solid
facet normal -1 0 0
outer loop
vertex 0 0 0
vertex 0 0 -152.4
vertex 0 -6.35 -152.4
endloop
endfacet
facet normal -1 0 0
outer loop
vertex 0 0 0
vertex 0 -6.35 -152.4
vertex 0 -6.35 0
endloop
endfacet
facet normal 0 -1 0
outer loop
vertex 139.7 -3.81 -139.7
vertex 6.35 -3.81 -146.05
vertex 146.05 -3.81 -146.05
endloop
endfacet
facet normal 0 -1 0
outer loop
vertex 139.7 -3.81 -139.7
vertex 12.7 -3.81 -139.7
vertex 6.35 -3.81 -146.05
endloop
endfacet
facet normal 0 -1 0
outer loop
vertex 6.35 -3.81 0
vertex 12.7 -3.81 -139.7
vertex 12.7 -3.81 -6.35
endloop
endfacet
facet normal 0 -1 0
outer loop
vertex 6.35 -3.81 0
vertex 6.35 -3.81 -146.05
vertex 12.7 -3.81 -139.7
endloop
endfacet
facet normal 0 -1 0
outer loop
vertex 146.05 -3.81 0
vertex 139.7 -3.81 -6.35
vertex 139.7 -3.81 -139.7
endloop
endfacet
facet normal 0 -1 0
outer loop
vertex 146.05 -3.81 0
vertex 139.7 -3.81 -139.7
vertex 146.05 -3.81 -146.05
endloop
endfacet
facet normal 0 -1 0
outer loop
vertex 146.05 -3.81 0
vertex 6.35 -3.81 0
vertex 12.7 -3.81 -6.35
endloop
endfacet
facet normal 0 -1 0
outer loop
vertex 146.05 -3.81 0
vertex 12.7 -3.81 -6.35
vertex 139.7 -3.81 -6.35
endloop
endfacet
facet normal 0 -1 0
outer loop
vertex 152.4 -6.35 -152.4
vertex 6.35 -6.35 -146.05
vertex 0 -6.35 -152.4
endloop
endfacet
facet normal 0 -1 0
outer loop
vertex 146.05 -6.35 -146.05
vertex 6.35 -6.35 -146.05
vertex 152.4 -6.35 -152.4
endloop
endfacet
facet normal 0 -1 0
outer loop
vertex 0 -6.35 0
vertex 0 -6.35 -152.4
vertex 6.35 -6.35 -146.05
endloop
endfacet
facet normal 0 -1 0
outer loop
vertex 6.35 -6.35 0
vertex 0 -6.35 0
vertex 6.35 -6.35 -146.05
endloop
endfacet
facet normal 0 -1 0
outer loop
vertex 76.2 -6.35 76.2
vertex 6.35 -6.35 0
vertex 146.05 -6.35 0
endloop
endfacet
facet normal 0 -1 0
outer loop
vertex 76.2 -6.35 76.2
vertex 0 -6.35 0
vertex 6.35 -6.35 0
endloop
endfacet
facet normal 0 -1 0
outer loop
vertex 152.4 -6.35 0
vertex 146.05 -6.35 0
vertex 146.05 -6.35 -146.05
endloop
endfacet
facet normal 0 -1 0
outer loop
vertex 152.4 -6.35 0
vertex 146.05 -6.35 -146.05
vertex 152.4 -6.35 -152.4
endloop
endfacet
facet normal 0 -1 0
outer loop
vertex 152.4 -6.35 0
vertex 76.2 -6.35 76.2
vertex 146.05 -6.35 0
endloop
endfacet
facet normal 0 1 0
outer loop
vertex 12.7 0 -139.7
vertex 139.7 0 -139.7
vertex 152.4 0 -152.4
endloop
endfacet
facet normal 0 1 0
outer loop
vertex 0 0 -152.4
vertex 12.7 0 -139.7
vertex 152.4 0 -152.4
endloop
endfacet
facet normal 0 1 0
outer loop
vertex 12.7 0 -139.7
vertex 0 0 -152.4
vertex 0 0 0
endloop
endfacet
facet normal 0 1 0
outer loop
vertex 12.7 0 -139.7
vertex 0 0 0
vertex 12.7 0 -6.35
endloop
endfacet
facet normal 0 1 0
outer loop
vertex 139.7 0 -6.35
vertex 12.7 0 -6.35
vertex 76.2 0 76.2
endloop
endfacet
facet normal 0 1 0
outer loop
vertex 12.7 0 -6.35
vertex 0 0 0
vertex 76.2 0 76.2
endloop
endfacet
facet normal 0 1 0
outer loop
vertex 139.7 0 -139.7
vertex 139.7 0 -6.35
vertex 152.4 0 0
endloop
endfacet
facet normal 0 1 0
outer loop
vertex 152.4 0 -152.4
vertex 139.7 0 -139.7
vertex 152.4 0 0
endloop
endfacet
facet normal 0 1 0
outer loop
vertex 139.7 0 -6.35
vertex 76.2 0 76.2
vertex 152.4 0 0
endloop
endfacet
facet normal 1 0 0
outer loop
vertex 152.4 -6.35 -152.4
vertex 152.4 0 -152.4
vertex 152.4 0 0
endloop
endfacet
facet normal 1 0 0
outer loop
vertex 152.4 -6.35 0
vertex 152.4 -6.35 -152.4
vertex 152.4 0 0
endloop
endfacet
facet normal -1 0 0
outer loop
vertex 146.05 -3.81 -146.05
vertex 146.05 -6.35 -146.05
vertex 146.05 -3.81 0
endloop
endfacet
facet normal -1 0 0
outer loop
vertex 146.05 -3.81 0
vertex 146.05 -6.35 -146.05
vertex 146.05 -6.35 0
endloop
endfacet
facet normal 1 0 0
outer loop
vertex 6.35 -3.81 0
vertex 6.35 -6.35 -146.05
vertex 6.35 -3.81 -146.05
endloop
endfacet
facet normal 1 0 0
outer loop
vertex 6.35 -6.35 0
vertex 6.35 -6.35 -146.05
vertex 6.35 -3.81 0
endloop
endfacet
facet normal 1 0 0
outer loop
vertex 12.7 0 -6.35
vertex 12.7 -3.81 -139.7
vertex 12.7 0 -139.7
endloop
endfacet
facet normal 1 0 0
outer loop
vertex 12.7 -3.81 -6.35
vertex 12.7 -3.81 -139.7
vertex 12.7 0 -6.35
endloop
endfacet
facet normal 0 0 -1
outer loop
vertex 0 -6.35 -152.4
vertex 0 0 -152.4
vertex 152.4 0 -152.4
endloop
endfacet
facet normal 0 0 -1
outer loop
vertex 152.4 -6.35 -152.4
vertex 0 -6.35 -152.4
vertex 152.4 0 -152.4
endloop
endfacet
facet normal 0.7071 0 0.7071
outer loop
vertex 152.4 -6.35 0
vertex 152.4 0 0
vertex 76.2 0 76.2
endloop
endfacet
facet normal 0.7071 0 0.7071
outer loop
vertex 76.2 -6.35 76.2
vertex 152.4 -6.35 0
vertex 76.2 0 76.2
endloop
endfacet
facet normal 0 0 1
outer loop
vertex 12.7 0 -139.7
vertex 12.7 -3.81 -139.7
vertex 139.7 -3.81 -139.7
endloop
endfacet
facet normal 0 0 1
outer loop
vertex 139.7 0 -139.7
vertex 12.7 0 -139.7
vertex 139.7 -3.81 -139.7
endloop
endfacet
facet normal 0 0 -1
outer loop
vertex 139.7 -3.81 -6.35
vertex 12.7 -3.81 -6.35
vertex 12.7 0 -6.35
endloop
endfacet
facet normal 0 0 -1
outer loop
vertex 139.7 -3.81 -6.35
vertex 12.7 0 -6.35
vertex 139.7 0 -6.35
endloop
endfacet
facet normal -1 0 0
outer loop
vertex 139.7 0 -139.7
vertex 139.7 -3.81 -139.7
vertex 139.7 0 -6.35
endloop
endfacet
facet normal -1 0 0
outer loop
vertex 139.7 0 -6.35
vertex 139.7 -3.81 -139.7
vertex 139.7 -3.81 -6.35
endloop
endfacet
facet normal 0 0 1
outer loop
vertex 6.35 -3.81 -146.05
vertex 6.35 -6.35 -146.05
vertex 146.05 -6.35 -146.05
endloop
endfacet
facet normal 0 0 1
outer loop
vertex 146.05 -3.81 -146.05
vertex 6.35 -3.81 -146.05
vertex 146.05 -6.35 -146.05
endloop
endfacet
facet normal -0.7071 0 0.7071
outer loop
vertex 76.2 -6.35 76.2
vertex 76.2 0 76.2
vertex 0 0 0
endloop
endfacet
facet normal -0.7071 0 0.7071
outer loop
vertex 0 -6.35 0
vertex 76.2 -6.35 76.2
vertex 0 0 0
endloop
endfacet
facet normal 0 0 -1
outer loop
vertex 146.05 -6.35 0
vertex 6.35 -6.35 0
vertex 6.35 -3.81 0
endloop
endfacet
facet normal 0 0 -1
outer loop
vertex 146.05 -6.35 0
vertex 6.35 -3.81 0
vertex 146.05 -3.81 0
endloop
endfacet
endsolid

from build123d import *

# Parameters (mm, degrees)
F0_W     = 152.4
F0_H     = 152.4
F1_DEPTH = 6.35
F2_W     = 139.7
F2_H     = 146.05
F3_DEPTH = 2.54
F4_W     = 127
F4_H     = 133.35
F5_DEPTH = 3.811


with BuildPart() as f1:
    # F0 (on Front) → F1 (new body)
    with BuildSketch(Plane.XZ):
        Polygon((76.2, 76.2), (0, 0), (152.4, 0), align=None)
        with Locations((76.2, -76.2)):
            Rectangle(F0_W, F0_H)
    extrude(amount=F1_DEPTH)

    # F2 (on face) → F3 (cut)
    with BuildSketch(Plane.XZ.offset(6.35)):
        with Locations((76.2, -73.025)):
            Rectangle(F2_W, F2_H)
    extrude(amount=-F3_DEPTH, mode=Mode.SUBTRACT)

    # F4 (on face) → F5 (cut, through all)
    with BuildSketch(Plane.XZ.offset(3.81)):
        with Locations((76.2, -73.025)):
            Rectangle(F4_W, F4_H)
    extrude(amount=-F5_DEPTH, mode=Mode.SUBTRACT)


solid = f1.part
